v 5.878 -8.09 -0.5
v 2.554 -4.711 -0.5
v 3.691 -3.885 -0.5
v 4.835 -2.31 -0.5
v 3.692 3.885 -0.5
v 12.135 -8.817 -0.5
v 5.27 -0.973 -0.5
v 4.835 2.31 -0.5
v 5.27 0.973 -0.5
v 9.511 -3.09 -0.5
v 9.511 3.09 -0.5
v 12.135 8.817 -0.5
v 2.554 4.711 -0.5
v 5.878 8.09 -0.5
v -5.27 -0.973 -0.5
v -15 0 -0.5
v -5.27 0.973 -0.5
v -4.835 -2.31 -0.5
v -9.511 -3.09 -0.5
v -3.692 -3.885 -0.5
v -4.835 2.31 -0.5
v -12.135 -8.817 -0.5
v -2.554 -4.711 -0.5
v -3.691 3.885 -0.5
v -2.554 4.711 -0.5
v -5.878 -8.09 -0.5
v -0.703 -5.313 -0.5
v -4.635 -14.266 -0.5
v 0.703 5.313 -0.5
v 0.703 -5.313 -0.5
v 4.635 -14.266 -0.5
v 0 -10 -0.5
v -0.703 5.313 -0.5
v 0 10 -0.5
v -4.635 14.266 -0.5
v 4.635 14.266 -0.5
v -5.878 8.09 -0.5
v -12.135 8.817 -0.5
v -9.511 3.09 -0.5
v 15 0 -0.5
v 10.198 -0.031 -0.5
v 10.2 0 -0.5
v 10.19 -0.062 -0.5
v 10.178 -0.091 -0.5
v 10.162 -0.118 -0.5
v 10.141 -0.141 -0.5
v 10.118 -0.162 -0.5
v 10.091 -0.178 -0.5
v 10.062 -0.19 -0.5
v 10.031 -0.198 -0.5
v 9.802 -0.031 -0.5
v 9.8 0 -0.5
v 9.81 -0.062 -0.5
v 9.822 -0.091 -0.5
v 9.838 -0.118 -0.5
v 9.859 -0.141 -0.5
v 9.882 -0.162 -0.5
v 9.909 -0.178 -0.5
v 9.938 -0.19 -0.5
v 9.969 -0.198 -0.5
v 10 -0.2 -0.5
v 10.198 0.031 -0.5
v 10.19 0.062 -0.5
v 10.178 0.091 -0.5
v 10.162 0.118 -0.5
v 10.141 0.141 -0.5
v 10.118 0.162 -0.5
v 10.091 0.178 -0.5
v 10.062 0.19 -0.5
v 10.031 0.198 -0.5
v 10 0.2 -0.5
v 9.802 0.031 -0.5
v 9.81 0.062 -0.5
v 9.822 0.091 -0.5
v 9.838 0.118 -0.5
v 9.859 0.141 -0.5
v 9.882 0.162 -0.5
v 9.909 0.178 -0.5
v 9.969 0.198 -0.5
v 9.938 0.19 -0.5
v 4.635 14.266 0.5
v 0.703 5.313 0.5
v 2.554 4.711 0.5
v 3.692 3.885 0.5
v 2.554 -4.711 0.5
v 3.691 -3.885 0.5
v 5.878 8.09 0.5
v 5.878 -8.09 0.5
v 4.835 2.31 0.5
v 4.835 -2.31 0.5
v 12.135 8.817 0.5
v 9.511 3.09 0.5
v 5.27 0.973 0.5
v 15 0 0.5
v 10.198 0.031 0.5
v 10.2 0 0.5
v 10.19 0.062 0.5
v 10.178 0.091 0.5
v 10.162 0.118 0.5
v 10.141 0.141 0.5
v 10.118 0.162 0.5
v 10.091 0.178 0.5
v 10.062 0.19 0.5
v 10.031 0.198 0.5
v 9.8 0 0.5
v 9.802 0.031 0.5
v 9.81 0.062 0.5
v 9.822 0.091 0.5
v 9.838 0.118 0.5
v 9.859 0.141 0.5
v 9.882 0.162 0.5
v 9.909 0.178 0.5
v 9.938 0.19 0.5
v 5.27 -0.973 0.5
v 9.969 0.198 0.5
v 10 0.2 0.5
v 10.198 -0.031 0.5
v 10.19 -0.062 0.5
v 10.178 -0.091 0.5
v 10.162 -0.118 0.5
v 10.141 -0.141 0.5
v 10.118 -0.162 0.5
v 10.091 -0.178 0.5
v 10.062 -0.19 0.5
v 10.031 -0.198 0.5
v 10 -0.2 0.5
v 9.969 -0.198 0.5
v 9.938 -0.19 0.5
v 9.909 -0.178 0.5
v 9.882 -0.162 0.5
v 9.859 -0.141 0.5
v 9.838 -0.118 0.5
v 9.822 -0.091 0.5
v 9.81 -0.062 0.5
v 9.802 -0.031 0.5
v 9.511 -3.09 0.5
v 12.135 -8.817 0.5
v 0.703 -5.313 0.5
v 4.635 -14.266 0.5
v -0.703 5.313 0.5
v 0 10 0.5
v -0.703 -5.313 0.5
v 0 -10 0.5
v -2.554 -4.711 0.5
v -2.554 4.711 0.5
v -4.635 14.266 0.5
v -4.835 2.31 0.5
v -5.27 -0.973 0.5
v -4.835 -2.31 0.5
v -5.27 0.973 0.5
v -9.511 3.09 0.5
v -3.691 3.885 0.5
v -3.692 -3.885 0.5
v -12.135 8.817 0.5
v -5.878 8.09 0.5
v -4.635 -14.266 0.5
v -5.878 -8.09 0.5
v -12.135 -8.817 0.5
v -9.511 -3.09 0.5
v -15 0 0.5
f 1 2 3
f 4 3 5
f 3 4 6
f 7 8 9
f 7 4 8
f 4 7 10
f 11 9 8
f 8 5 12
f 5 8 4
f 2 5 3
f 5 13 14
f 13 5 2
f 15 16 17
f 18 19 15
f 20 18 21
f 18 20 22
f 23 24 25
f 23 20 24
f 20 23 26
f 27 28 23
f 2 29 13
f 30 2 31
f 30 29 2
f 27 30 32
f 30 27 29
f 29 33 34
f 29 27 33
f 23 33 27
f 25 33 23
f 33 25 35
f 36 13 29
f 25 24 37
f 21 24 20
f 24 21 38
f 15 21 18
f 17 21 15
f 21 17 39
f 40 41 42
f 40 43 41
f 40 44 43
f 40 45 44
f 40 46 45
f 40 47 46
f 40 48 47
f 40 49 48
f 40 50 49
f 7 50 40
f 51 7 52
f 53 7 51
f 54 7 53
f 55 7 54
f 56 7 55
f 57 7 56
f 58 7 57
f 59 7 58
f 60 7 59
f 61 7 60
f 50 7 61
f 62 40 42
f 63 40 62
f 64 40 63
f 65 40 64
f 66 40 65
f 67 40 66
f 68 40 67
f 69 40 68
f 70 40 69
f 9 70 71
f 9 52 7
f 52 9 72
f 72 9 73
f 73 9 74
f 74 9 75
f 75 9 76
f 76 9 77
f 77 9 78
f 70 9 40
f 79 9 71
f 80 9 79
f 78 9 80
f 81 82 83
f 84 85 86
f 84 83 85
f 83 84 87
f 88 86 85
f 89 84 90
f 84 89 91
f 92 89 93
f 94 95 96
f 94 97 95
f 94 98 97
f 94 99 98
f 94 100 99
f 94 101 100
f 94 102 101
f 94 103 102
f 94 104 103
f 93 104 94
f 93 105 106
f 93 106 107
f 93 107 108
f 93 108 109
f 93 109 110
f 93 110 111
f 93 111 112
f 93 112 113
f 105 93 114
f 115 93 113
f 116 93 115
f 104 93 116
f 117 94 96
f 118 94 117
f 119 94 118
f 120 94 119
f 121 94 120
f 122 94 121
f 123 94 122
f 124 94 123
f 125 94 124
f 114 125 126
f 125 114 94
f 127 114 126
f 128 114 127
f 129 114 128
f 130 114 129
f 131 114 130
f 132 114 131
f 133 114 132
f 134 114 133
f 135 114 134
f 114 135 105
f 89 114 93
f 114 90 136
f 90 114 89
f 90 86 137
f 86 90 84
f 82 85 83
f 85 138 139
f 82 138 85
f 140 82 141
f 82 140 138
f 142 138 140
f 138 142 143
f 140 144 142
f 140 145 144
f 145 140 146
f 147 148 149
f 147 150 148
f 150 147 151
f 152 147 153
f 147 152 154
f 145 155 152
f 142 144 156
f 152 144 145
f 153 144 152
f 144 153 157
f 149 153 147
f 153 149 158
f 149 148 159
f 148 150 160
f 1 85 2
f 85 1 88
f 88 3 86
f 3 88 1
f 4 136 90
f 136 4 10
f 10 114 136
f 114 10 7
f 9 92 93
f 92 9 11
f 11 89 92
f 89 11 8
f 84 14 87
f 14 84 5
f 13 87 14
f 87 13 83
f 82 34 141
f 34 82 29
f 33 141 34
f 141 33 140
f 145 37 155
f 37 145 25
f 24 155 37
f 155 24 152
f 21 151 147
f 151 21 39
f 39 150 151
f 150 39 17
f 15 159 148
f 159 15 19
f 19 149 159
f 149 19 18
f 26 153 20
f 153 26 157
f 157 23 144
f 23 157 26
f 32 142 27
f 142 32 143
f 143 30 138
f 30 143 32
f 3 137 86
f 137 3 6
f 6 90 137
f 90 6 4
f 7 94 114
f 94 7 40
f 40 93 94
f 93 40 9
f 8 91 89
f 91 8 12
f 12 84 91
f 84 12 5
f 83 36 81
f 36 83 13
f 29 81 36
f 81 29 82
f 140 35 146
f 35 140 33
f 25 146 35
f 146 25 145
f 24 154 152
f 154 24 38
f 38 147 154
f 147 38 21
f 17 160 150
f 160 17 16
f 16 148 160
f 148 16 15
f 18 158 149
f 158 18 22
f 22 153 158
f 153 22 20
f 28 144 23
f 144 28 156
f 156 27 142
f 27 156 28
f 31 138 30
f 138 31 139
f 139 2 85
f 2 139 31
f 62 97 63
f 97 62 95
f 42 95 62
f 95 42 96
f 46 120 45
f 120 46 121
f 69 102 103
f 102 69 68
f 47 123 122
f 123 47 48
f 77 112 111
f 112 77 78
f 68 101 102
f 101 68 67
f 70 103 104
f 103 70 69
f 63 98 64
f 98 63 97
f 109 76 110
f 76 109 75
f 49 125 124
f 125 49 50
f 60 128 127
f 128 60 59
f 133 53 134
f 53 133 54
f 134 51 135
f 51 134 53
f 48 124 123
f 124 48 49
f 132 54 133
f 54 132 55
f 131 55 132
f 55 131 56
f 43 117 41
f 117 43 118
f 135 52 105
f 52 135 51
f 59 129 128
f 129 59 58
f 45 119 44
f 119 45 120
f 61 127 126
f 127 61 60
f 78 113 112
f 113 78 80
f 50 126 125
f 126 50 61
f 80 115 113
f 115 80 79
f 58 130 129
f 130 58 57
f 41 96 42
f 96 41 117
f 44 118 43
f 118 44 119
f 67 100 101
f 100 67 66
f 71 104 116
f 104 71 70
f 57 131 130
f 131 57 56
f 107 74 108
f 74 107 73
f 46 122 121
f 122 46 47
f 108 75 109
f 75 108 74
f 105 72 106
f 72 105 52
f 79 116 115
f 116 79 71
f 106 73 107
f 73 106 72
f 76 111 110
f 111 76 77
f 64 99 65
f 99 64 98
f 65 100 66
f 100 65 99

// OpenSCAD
/********************************************************************
 * TinkerLib : Star ornament and tree topper
 * https://github.com/tinkerology/tinkerlib
 * By Scott P Leslie (https://twitter.com/tinkerology)
 * Licensed Under Creative Commons Attributions Share Alike 
 * (http://creativecommons.org/licenses/by-sa/3.0/deed.en_US)
 *******************************************************************/

FRAGMENTS=40;

module drawStar(points, length, width, height)
{
	linear_extrude(height=height, center = true, convexity = 10, twist = 0)
	for ( i = [0 : points] )
	{
		rotate( [0,0,i*(360/points)])
		polygon(points=[[-1*width/2,0],[0,length],[width/2,0]], paths=[[0,1,2,0]]);
	}
}

module drawStarWithTwoRayLengths(points, length1, length2, width, height)
{
	drawStar(points, length1, width, height );
	rotate([0,0,180/points])
	drawStar(points, length2, width, height );
}

module drawCylinder(depth, radius)
{
//	cylinder(depth, radius, radius, $fn=FRAGMENTS);
	linear_extrude(height = depth, center = true, convexity = 10, twist = 0)
	circle(radius, $fn=FRAGMENTS);
}

module drawRing(radius, inner, thickness)
{
	difference()
	{
		drawCylinder( thickness, radius );

		drawCylinder( thickness, inner );
	}
}

module drawStarTreeTopper()
{
	drawStarWithTwoRayLengths(10, 10, 15, 3, 1 );

	translate([0,0,5])
	rotate([0,90,0])
	drawRing(5,4,1);

	translate([4,0,4])
	rotate([0,90,0])
	drawRing(4,3,1);
}

module drawStarOrnament()
{
	difference()
	{
		drawStarWithTwoRayLengths(10, 10, 15, 3, 1 );

		translate([10,0,0])
		drawCylinder( 1, .20 );
	}
}

drawStarOrnament();

//translate([35,0,0])
//drawStarTreeTopper();
